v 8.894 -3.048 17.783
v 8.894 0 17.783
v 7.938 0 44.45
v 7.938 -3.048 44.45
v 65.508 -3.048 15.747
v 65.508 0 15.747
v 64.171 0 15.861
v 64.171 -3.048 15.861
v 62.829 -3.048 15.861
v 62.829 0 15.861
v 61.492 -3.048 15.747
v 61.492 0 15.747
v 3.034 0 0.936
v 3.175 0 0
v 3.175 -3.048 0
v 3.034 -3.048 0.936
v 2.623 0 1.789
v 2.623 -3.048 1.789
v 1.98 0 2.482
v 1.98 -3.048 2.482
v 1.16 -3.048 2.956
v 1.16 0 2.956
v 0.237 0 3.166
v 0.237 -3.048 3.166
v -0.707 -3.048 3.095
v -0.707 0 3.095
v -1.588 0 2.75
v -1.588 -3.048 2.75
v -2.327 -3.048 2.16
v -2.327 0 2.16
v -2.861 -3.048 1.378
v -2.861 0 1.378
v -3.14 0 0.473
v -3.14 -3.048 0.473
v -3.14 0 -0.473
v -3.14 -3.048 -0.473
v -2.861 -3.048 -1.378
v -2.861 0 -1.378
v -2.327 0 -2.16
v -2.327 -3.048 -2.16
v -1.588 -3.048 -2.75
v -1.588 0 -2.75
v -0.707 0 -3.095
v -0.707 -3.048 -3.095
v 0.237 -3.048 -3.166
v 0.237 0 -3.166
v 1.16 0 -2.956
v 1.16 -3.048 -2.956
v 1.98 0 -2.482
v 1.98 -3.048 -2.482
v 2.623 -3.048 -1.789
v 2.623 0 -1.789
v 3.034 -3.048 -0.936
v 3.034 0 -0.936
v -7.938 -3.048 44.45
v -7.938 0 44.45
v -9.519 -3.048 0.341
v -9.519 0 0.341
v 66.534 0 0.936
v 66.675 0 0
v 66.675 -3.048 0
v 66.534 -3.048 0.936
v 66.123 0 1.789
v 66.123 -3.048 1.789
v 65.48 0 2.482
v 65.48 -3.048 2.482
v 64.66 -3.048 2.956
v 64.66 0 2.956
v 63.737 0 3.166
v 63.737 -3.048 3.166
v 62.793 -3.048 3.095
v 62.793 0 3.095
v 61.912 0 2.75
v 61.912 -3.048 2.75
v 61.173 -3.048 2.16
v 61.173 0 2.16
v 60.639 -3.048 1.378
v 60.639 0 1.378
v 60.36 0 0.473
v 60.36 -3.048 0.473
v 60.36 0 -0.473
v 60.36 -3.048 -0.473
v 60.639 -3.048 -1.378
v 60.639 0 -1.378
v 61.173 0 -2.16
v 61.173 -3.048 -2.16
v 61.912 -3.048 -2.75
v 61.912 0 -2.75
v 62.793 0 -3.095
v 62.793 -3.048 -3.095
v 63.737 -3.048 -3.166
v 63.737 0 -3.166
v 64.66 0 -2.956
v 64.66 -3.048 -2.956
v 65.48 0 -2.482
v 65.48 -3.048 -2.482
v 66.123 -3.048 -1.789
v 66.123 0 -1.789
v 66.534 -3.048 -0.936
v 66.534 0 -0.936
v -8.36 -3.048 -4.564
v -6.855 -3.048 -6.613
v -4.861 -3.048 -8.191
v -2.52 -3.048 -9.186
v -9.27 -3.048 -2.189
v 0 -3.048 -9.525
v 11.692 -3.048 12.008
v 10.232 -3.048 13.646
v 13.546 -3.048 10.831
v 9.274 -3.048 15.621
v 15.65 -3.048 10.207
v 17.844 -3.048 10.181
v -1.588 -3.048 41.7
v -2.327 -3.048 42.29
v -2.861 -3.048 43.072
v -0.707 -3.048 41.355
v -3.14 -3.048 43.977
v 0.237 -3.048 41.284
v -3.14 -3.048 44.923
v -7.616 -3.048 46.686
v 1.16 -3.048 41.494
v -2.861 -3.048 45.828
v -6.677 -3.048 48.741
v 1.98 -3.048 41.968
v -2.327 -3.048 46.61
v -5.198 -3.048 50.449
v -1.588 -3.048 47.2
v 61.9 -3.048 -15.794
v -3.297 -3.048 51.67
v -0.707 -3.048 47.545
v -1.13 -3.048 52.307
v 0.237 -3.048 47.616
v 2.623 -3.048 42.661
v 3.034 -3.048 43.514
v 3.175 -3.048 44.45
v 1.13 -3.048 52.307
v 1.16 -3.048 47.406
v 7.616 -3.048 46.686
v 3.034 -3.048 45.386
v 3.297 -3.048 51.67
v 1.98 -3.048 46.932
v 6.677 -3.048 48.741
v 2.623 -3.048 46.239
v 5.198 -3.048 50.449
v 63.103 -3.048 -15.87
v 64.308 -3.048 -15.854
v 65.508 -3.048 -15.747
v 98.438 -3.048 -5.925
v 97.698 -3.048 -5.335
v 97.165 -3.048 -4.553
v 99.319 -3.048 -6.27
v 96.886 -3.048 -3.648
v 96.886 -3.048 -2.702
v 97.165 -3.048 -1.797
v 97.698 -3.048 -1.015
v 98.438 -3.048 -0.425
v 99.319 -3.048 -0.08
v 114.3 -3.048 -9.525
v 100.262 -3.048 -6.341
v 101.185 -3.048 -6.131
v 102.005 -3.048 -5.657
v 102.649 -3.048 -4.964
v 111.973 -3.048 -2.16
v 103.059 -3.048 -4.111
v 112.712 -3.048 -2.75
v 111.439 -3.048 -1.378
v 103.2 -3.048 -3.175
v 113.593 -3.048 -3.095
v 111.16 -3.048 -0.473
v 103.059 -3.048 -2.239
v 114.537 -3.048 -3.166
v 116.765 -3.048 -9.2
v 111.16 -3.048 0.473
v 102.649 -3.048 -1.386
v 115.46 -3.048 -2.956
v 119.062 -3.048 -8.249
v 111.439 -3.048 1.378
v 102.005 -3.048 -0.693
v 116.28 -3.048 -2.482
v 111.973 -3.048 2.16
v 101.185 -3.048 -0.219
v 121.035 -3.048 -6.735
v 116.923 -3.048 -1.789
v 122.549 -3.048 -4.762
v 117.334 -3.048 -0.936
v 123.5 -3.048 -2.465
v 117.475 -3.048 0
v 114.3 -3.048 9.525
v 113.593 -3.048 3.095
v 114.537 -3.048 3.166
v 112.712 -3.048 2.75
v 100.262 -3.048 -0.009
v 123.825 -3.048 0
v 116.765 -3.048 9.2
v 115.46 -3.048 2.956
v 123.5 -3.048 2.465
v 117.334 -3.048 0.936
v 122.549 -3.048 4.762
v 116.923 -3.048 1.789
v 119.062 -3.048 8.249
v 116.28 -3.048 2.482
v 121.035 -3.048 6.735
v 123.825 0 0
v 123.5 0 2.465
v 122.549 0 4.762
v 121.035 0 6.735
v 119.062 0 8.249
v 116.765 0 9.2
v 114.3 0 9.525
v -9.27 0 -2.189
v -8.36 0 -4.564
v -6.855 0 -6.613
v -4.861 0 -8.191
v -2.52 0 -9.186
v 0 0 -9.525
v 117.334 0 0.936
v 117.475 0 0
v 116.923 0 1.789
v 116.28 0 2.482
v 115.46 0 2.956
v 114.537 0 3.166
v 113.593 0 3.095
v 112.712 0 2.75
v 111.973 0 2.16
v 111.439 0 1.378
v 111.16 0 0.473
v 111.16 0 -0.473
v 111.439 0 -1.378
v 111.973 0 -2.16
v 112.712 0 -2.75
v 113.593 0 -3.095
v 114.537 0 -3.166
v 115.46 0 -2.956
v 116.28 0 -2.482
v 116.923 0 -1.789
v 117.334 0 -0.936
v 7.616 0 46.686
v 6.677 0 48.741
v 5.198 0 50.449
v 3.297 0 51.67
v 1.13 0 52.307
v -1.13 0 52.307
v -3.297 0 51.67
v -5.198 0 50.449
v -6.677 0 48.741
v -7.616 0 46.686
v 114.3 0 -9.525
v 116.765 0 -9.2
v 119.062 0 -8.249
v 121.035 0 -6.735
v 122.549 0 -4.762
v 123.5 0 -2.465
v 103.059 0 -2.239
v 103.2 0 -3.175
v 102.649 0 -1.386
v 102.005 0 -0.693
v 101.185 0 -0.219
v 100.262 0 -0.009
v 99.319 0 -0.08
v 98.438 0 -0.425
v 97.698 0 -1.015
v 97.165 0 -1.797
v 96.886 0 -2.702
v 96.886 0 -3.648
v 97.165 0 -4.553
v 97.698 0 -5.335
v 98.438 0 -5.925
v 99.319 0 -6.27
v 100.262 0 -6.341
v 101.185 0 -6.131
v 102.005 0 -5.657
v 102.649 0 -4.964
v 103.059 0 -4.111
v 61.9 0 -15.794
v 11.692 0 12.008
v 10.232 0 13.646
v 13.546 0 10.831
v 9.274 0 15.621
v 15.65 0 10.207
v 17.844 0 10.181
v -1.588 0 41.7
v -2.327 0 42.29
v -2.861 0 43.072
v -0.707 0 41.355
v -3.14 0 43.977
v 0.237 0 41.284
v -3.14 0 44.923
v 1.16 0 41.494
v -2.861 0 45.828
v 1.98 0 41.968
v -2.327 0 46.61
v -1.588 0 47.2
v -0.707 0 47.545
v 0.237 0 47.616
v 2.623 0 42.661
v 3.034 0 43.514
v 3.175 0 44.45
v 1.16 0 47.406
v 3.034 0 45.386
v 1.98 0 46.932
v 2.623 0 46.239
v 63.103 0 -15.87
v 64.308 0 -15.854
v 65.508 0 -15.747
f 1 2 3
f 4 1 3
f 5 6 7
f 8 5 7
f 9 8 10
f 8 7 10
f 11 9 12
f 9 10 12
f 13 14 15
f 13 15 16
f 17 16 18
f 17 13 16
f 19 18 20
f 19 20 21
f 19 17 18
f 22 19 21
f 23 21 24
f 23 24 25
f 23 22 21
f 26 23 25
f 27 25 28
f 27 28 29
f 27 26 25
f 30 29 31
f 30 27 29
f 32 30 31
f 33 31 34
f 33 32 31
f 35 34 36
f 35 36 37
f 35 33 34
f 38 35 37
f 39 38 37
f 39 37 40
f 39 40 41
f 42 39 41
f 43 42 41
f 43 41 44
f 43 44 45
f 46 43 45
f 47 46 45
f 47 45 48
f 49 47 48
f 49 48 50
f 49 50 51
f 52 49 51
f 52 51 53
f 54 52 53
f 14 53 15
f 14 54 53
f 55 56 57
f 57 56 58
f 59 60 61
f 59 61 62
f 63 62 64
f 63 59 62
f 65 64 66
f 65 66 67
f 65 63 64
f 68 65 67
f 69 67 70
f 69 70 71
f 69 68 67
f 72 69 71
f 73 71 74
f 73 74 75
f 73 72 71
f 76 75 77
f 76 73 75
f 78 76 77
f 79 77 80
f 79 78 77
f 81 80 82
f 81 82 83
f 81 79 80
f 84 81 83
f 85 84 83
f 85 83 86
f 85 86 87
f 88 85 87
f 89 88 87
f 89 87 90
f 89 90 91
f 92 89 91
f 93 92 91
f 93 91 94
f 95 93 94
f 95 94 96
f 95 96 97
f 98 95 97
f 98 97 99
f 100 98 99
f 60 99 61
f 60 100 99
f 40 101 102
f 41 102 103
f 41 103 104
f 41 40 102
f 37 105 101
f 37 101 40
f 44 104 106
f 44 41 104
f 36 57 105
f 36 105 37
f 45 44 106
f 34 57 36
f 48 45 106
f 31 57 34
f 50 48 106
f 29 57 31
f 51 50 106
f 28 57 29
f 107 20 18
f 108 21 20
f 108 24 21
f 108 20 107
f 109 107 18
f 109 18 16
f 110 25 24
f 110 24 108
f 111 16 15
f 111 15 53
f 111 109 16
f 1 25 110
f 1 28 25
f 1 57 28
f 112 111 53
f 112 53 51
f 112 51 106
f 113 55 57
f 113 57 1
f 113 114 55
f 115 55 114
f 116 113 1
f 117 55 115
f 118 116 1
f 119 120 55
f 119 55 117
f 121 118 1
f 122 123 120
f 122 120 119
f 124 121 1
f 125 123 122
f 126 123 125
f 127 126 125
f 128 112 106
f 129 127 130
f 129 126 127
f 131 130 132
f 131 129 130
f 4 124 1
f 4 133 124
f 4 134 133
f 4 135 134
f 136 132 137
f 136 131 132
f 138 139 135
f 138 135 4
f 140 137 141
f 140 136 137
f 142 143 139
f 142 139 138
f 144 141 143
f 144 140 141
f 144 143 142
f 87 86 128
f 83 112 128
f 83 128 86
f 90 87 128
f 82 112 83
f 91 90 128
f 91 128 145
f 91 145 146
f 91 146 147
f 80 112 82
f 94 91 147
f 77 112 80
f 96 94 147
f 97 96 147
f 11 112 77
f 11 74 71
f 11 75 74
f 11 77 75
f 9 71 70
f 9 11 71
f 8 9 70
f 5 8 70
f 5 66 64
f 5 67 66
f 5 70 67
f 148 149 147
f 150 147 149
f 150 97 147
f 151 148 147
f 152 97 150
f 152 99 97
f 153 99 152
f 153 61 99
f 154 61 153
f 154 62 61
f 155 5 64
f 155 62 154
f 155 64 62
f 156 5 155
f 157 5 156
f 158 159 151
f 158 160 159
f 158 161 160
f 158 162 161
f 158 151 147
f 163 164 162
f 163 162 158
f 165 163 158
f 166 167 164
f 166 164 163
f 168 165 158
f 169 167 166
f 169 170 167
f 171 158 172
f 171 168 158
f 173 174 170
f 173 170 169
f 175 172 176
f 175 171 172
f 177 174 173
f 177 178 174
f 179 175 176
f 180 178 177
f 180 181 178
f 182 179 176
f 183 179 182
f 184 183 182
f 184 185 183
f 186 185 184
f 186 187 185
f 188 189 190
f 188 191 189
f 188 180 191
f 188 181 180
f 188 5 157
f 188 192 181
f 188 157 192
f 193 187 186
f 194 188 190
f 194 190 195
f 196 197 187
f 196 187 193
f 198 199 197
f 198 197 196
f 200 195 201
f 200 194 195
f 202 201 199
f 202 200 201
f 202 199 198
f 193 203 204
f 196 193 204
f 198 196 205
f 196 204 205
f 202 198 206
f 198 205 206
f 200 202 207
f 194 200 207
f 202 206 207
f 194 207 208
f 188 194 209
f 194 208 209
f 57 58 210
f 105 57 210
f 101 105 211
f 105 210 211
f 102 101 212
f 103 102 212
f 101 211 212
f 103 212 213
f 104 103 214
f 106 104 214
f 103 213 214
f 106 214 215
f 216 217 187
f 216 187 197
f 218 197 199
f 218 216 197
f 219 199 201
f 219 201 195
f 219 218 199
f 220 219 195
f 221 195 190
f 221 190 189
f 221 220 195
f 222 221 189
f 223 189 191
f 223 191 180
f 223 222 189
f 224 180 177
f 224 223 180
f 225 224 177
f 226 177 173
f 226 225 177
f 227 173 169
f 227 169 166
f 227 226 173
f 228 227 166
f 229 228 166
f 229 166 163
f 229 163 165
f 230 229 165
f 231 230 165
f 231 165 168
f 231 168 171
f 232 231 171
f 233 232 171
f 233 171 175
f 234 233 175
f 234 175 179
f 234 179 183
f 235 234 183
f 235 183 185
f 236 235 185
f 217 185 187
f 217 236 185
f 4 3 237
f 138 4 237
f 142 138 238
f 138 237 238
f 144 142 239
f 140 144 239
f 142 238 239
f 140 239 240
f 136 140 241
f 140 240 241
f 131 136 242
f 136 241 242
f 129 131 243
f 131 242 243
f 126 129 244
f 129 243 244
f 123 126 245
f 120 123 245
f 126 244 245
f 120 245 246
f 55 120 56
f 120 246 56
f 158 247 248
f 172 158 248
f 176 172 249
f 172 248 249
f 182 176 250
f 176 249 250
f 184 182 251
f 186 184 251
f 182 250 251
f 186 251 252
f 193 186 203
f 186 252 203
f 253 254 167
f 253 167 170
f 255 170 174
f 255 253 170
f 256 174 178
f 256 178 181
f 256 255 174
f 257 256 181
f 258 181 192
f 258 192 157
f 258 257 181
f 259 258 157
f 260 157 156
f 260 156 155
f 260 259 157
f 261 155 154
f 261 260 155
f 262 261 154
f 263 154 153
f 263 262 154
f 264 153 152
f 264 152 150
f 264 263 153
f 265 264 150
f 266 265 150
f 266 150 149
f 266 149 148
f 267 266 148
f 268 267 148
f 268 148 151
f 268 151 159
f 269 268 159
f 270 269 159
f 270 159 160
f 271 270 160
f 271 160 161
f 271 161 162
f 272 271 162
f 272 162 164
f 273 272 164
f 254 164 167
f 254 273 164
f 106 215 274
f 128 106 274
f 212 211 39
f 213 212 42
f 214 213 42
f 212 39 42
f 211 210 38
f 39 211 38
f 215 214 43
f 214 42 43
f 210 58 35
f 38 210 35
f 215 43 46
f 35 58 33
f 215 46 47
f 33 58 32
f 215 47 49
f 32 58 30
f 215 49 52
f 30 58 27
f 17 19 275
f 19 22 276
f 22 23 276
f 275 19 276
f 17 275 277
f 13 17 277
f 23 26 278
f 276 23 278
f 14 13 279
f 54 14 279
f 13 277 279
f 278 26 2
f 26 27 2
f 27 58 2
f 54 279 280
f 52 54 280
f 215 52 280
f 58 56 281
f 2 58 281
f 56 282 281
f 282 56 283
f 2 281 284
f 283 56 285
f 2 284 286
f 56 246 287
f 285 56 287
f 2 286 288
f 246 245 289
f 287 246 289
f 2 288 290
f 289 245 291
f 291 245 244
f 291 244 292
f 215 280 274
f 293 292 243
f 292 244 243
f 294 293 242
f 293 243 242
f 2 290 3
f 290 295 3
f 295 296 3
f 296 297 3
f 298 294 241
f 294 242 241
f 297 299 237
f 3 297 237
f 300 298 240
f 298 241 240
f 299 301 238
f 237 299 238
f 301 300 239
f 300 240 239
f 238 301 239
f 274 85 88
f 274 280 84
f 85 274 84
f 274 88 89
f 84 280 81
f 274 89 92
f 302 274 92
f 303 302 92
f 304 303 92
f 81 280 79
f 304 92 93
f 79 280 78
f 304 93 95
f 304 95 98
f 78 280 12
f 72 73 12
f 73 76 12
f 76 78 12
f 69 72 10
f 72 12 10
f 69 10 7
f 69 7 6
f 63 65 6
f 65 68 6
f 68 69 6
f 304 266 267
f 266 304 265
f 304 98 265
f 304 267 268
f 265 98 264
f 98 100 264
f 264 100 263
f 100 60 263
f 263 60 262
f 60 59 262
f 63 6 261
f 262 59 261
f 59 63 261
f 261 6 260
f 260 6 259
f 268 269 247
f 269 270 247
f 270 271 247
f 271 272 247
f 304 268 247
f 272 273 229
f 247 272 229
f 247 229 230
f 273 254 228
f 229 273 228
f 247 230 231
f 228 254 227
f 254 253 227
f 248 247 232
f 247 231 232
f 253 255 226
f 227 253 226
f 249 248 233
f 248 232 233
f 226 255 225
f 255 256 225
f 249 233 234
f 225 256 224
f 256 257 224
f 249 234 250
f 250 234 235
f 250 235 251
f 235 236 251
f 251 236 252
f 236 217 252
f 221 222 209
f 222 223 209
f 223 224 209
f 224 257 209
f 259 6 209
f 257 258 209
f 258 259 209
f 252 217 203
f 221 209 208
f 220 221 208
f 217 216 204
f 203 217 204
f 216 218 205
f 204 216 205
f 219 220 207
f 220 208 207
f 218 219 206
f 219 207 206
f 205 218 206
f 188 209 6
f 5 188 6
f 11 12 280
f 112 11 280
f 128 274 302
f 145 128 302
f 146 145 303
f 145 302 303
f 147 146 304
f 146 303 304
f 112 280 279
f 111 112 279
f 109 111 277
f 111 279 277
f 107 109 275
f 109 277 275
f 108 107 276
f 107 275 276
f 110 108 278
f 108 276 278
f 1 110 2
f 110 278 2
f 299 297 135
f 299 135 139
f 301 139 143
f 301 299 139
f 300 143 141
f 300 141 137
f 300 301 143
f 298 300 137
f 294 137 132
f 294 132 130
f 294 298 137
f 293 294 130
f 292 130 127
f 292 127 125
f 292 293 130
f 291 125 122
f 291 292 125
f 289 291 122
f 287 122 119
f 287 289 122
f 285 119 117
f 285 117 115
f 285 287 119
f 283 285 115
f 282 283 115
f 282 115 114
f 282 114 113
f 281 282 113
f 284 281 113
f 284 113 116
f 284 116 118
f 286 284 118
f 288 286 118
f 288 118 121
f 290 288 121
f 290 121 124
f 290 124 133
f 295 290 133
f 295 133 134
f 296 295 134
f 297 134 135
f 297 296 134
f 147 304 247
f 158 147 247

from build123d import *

# Parameters (mm, degrees)
F0_R     = 3.175
F1_DEPTH = 3.048


with BuildPart() as f1:
    # F0 (on Front) → F1 (new body)
    with BuildSketch(Plane.XZ):
        with BuildLine():
            ThreePointArc((-7.9375, 44.45), (0, 36.5125), (7.9375, 44.45))
            ThreePointArc((7.9375, 44.45), (0, 52.3875), (-7.9375, 44.45))
        make_face()
        with Locations((0, 44.45)):
            Circle(F0_R, mode=Mode.SUBTRACT)
        with BuildLine():
            Line((8.89358, 17.782553), (7.9375, 44.45))
            ThreePointArc((7.9375, 44.45), (0, 36.5125), (-7.9375, 44.45))
            Line((-7.9375, 44.45), (-9.518884, 0.341271))
            ThreePointArc((-9.518884, 0.341271), (0.170663, 9.523471), (9.525, 0))
            ThreePointArc((9.525, 0), (6.735192, -6.735192), (0, -9.525))
            Line((0, -9.525), (61.90038, -15.794203))
            ThreePointArc((61.90038, -15.794203), (47.626332, -0.205667), (61.491711, 15.747457))
            Line((61.491711, 15.747457), (17.844427, 10.181074))
            ThreePointArc((17.844427, 10.181074), (11.692391, 12.007579), (8.89358, 17.782553))
        make_face()
        with BuildLine():
            ThreePointArc((9.525, 0), (0.170663, 9.523471), (-9.518884, 0.341271))
            ThreePointArc((-9.518884, 0.341271), (-6.854788, -6.613434), (0, -9.525))
            ThreePointArc((0, -9.525), (6.735192, -6.735192), (9.525, 0))
        make_face()
        Circle(F0_R, mode=Mode.SUBTRACT)
        with BuildLine():
            ThreePointArc((65.508289, 15.747457), (63.5, 15.875), (61.491711, 15.747457))
            ThreePointArc((61.491711, 15.747457), (47.626332, -0.205667), (61.90038, -15.794203))
            ThreePointArc((61.90038, -15.794203), (63.705667, -15.873668), (65.508289, -15.747457))
            ThreePointArc((65.508289, -15.747457), (75.414219, -10.491283), (79.375, 0))
            ThreePointArc((79.375, 0), (75.414219, 10.491283), (65.508289, 15.747457))
        make_face()
        with Locations((63.5, 0)):
            Circle(F0_R, mode=Mode.SUBTRACT)
        with BuildLine():
            Line((114.3, 9.525), (65.508289, 15.747457))
            ThreePointArc((65.508289, 15.747457), (75.414219, 10.491283), (79.375, 0))
            ThreePointArc((79.375, 0), (75.414219, -10.491283), (65.508289, -15.747457))
            Line((65.508289, -15.747457), (114.3, -9.525))
            ThreePointArc((114.3, -9.525), (104.775, 0), (114.3, 9.525))
        make_face()
        with Locations((100.0252, -3.175)):
            Circle(F0_R, mode=Mode.SUBTRACT)
        with BuildLine():
            ThreePointArc((123.825, 0), (121.035192, 6.735192), (114.3, 9.525))
            ThreePointArc((114.3, 9.525), (104.775, 0), (114.3, -9.525))
            ThreePointArc((114.3, -9.525), (121.035192, -6.735192), (123.825, 0))
        make_face()
        with Locations((114.3, 0)):
            Circle(F0_R, mode=Mode.SUBTRACT)
    extrude(amount=F1_DEPTH)


solid = f1.part
